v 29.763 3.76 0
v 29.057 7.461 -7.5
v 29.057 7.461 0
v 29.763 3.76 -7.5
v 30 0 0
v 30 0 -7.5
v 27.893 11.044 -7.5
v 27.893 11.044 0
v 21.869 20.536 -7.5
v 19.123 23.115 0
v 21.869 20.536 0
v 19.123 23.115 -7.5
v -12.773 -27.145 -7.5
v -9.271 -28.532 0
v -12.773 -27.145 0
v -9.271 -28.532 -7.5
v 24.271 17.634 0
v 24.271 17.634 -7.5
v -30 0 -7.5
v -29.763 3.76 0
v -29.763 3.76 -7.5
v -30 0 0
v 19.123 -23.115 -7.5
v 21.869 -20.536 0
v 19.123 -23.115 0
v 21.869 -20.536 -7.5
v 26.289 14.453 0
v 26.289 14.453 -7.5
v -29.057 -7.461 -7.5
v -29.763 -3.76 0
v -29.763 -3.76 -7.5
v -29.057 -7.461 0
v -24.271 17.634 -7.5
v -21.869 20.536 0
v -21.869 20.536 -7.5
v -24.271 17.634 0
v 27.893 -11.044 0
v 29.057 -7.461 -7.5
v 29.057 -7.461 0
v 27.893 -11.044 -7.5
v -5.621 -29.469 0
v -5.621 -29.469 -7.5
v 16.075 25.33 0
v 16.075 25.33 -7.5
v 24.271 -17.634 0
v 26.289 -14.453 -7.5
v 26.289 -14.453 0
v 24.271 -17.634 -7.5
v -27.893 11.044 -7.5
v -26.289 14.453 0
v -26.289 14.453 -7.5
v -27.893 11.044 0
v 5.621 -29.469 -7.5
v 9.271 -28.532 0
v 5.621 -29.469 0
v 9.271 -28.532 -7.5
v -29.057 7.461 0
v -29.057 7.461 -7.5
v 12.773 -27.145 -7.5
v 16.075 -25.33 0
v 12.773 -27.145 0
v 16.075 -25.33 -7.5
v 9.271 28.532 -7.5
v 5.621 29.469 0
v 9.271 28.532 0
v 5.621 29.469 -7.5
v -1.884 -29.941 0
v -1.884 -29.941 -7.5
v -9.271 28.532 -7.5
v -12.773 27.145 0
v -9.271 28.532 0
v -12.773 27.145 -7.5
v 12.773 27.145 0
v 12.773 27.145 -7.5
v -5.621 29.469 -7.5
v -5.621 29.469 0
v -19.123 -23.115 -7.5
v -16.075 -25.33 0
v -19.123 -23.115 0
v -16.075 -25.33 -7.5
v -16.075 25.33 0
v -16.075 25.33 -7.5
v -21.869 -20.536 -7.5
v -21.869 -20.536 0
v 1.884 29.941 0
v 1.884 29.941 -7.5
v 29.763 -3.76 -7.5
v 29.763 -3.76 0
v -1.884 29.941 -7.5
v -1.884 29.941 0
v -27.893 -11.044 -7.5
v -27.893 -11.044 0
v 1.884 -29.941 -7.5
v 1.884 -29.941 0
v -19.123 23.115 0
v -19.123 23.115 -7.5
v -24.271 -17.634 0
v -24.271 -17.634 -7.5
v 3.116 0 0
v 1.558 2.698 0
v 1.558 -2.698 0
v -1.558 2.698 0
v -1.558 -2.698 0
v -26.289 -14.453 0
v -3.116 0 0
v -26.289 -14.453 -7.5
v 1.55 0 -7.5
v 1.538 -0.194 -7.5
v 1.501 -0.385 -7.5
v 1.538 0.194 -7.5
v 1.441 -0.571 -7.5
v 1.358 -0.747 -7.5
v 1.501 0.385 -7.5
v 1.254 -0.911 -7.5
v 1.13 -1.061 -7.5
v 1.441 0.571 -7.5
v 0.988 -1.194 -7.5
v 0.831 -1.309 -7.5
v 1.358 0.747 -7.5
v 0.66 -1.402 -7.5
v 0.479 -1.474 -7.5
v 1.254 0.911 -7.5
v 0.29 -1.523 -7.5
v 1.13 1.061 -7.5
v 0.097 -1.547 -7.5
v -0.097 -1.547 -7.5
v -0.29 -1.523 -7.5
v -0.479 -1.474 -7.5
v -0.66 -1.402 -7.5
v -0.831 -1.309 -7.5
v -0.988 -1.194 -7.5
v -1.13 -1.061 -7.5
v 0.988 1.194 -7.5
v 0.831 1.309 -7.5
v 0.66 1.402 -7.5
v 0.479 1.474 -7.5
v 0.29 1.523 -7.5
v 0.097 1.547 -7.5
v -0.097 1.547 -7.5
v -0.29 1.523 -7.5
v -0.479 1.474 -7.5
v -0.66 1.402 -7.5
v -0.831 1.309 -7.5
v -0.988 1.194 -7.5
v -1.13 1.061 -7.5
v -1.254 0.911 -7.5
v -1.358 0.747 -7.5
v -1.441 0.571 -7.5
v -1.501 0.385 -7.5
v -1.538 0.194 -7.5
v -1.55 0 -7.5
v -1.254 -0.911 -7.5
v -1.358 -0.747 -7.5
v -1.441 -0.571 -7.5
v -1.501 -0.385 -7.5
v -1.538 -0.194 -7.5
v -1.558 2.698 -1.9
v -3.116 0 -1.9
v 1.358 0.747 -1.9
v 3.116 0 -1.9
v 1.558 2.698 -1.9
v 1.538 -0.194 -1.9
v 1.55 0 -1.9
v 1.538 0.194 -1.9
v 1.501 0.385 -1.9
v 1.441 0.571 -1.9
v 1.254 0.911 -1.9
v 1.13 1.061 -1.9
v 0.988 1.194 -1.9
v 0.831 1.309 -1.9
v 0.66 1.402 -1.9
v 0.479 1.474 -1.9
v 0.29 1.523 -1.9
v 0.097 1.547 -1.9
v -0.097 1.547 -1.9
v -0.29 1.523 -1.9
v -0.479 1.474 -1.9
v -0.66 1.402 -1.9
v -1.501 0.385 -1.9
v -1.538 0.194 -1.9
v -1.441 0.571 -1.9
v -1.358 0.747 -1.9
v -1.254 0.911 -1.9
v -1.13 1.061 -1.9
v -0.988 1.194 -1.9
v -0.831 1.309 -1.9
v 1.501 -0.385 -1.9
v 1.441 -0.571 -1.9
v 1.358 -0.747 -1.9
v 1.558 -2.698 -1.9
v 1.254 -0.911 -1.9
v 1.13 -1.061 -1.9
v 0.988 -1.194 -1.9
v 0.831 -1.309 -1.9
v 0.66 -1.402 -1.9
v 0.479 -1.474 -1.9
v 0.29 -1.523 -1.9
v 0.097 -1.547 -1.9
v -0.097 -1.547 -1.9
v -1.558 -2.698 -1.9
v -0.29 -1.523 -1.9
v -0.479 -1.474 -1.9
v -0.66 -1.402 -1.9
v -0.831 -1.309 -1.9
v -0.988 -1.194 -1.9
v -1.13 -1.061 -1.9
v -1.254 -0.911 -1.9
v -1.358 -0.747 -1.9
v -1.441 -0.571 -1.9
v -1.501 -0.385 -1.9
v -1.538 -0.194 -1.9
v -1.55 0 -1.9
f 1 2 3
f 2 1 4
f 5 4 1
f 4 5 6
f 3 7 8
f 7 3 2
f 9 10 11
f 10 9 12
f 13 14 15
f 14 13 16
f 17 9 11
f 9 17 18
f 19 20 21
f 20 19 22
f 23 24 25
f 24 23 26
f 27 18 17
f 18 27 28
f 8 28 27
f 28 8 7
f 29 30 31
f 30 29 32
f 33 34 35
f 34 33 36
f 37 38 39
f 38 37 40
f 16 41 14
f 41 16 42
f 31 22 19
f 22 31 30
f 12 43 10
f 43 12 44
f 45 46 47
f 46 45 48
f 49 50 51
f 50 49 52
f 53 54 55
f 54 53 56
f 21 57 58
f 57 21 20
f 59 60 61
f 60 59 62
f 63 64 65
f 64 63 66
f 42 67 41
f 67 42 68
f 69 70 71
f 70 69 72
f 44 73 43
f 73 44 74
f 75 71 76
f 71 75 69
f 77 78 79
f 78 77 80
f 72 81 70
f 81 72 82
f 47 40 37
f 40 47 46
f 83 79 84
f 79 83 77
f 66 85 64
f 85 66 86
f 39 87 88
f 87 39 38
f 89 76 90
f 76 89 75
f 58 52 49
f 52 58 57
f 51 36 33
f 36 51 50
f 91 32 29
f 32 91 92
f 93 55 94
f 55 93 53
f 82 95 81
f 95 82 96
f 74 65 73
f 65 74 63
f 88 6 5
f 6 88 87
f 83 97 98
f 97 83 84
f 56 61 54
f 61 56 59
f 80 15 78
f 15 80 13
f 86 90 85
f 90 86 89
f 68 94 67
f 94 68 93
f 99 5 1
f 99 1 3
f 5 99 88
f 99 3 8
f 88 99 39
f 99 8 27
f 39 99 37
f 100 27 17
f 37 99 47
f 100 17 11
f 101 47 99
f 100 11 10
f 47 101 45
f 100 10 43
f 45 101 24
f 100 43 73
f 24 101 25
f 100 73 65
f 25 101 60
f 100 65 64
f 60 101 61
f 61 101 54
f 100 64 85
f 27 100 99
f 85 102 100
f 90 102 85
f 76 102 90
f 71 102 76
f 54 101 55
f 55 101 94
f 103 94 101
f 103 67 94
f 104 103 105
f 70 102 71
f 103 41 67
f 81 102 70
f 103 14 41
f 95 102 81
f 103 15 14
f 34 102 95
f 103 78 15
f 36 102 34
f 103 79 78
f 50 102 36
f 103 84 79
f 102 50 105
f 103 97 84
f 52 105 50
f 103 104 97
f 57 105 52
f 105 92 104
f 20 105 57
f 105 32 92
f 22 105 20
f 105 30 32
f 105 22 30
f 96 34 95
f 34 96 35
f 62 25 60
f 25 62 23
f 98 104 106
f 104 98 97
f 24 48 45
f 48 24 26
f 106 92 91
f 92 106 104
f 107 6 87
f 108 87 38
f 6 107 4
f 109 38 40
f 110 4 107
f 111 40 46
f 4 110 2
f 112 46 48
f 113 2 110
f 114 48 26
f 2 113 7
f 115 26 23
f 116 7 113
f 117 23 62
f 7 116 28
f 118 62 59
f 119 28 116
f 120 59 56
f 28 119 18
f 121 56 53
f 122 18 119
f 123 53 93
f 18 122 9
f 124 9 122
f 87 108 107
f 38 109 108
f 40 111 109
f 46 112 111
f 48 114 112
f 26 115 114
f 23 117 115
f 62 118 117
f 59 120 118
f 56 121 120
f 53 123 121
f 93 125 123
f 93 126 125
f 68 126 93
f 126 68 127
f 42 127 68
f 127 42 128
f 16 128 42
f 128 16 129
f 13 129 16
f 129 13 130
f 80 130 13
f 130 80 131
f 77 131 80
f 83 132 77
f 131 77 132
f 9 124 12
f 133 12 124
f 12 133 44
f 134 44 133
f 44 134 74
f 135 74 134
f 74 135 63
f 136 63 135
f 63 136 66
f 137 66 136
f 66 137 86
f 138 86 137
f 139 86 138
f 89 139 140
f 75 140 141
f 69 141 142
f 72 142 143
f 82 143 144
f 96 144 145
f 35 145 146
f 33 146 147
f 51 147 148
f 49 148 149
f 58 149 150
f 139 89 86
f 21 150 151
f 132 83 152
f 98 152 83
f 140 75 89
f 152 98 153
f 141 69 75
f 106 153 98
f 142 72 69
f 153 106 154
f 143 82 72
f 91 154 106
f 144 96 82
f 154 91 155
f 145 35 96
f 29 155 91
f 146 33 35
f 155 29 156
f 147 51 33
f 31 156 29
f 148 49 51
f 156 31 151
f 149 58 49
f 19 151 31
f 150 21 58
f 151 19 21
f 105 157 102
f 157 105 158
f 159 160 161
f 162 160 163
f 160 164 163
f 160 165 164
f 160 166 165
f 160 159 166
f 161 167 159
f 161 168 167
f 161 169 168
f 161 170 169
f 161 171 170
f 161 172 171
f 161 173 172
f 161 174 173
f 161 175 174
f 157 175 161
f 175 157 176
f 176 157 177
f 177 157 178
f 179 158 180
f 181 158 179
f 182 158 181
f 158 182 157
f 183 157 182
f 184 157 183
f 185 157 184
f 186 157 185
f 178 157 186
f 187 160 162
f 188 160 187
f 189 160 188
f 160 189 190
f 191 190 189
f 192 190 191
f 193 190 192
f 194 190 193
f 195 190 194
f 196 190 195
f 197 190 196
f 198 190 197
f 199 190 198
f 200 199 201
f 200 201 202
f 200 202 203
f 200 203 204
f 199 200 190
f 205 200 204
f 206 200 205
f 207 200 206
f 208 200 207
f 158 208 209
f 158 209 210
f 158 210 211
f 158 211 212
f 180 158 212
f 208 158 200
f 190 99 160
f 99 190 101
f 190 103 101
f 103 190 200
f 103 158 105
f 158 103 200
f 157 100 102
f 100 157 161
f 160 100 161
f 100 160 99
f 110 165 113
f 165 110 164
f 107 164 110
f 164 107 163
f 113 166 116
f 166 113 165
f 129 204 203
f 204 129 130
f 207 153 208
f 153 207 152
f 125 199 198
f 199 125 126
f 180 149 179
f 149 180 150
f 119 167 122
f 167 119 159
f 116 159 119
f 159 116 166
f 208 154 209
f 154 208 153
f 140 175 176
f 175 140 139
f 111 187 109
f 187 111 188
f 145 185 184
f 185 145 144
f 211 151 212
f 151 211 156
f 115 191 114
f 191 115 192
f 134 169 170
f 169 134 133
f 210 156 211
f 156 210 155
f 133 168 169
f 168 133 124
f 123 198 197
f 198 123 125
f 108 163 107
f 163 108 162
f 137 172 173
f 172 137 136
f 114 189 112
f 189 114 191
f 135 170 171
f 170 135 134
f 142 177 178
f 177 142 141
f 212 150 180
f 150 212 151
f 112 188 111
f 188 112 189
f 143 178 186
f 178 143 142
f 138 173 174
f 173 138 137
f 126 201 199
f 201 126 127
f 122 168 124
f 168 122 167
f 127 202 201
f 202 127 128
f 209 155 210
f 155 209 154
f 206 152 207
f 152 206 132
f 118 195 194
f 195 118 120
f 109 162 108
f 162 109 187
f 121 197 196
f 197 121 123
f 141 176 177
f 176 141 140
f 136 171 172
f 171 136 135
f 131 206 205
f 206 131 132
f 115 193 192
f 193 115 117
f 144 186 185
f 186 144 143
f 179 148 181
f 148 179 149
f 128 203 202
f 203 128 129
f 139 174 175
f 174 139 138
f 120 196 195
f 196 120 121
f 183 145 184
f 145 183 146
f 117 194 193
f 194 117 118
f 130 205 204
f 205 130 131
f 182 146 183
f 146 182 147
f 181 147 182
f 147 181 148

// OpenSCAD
$fn = 50;


difference() {
	union() {
		translate(v = [0, 0, -7.5000000000]) {
			cylinder(h = 7.5000000000, r = 30.0000000000);
		}
		translate(v = [0, 0, -6.0000000000]) {
			cylinder(h = 6, r = 2.8750000000);
		}
	}
	union() {
		translate(v = [0, 0, 0]) {
			rotate(a = [0, 0, 0]) {
				difference() {
					union() {
						translate(v = [0, 0, -1.9000000000]) {
							linear_extrude(height = 1.9000000000) {
								polygon(points = [[3.1158000000, 0.0000000000], [1.5579000000, 2.6983619531], [-1.5579000000, 2.6983619531], [-3.1158000000, 0.0000000000], [-1.5579000000, -2.6983619531], [1.5579000000, -2.6983619531]]);
							}
						}
					}
					union();
				}
			}
		}
		#translate(v = [0, 0, -100.0000000000]) {
			cylinder(h = 200, r = 1.5500000000);
		}
	}
}
